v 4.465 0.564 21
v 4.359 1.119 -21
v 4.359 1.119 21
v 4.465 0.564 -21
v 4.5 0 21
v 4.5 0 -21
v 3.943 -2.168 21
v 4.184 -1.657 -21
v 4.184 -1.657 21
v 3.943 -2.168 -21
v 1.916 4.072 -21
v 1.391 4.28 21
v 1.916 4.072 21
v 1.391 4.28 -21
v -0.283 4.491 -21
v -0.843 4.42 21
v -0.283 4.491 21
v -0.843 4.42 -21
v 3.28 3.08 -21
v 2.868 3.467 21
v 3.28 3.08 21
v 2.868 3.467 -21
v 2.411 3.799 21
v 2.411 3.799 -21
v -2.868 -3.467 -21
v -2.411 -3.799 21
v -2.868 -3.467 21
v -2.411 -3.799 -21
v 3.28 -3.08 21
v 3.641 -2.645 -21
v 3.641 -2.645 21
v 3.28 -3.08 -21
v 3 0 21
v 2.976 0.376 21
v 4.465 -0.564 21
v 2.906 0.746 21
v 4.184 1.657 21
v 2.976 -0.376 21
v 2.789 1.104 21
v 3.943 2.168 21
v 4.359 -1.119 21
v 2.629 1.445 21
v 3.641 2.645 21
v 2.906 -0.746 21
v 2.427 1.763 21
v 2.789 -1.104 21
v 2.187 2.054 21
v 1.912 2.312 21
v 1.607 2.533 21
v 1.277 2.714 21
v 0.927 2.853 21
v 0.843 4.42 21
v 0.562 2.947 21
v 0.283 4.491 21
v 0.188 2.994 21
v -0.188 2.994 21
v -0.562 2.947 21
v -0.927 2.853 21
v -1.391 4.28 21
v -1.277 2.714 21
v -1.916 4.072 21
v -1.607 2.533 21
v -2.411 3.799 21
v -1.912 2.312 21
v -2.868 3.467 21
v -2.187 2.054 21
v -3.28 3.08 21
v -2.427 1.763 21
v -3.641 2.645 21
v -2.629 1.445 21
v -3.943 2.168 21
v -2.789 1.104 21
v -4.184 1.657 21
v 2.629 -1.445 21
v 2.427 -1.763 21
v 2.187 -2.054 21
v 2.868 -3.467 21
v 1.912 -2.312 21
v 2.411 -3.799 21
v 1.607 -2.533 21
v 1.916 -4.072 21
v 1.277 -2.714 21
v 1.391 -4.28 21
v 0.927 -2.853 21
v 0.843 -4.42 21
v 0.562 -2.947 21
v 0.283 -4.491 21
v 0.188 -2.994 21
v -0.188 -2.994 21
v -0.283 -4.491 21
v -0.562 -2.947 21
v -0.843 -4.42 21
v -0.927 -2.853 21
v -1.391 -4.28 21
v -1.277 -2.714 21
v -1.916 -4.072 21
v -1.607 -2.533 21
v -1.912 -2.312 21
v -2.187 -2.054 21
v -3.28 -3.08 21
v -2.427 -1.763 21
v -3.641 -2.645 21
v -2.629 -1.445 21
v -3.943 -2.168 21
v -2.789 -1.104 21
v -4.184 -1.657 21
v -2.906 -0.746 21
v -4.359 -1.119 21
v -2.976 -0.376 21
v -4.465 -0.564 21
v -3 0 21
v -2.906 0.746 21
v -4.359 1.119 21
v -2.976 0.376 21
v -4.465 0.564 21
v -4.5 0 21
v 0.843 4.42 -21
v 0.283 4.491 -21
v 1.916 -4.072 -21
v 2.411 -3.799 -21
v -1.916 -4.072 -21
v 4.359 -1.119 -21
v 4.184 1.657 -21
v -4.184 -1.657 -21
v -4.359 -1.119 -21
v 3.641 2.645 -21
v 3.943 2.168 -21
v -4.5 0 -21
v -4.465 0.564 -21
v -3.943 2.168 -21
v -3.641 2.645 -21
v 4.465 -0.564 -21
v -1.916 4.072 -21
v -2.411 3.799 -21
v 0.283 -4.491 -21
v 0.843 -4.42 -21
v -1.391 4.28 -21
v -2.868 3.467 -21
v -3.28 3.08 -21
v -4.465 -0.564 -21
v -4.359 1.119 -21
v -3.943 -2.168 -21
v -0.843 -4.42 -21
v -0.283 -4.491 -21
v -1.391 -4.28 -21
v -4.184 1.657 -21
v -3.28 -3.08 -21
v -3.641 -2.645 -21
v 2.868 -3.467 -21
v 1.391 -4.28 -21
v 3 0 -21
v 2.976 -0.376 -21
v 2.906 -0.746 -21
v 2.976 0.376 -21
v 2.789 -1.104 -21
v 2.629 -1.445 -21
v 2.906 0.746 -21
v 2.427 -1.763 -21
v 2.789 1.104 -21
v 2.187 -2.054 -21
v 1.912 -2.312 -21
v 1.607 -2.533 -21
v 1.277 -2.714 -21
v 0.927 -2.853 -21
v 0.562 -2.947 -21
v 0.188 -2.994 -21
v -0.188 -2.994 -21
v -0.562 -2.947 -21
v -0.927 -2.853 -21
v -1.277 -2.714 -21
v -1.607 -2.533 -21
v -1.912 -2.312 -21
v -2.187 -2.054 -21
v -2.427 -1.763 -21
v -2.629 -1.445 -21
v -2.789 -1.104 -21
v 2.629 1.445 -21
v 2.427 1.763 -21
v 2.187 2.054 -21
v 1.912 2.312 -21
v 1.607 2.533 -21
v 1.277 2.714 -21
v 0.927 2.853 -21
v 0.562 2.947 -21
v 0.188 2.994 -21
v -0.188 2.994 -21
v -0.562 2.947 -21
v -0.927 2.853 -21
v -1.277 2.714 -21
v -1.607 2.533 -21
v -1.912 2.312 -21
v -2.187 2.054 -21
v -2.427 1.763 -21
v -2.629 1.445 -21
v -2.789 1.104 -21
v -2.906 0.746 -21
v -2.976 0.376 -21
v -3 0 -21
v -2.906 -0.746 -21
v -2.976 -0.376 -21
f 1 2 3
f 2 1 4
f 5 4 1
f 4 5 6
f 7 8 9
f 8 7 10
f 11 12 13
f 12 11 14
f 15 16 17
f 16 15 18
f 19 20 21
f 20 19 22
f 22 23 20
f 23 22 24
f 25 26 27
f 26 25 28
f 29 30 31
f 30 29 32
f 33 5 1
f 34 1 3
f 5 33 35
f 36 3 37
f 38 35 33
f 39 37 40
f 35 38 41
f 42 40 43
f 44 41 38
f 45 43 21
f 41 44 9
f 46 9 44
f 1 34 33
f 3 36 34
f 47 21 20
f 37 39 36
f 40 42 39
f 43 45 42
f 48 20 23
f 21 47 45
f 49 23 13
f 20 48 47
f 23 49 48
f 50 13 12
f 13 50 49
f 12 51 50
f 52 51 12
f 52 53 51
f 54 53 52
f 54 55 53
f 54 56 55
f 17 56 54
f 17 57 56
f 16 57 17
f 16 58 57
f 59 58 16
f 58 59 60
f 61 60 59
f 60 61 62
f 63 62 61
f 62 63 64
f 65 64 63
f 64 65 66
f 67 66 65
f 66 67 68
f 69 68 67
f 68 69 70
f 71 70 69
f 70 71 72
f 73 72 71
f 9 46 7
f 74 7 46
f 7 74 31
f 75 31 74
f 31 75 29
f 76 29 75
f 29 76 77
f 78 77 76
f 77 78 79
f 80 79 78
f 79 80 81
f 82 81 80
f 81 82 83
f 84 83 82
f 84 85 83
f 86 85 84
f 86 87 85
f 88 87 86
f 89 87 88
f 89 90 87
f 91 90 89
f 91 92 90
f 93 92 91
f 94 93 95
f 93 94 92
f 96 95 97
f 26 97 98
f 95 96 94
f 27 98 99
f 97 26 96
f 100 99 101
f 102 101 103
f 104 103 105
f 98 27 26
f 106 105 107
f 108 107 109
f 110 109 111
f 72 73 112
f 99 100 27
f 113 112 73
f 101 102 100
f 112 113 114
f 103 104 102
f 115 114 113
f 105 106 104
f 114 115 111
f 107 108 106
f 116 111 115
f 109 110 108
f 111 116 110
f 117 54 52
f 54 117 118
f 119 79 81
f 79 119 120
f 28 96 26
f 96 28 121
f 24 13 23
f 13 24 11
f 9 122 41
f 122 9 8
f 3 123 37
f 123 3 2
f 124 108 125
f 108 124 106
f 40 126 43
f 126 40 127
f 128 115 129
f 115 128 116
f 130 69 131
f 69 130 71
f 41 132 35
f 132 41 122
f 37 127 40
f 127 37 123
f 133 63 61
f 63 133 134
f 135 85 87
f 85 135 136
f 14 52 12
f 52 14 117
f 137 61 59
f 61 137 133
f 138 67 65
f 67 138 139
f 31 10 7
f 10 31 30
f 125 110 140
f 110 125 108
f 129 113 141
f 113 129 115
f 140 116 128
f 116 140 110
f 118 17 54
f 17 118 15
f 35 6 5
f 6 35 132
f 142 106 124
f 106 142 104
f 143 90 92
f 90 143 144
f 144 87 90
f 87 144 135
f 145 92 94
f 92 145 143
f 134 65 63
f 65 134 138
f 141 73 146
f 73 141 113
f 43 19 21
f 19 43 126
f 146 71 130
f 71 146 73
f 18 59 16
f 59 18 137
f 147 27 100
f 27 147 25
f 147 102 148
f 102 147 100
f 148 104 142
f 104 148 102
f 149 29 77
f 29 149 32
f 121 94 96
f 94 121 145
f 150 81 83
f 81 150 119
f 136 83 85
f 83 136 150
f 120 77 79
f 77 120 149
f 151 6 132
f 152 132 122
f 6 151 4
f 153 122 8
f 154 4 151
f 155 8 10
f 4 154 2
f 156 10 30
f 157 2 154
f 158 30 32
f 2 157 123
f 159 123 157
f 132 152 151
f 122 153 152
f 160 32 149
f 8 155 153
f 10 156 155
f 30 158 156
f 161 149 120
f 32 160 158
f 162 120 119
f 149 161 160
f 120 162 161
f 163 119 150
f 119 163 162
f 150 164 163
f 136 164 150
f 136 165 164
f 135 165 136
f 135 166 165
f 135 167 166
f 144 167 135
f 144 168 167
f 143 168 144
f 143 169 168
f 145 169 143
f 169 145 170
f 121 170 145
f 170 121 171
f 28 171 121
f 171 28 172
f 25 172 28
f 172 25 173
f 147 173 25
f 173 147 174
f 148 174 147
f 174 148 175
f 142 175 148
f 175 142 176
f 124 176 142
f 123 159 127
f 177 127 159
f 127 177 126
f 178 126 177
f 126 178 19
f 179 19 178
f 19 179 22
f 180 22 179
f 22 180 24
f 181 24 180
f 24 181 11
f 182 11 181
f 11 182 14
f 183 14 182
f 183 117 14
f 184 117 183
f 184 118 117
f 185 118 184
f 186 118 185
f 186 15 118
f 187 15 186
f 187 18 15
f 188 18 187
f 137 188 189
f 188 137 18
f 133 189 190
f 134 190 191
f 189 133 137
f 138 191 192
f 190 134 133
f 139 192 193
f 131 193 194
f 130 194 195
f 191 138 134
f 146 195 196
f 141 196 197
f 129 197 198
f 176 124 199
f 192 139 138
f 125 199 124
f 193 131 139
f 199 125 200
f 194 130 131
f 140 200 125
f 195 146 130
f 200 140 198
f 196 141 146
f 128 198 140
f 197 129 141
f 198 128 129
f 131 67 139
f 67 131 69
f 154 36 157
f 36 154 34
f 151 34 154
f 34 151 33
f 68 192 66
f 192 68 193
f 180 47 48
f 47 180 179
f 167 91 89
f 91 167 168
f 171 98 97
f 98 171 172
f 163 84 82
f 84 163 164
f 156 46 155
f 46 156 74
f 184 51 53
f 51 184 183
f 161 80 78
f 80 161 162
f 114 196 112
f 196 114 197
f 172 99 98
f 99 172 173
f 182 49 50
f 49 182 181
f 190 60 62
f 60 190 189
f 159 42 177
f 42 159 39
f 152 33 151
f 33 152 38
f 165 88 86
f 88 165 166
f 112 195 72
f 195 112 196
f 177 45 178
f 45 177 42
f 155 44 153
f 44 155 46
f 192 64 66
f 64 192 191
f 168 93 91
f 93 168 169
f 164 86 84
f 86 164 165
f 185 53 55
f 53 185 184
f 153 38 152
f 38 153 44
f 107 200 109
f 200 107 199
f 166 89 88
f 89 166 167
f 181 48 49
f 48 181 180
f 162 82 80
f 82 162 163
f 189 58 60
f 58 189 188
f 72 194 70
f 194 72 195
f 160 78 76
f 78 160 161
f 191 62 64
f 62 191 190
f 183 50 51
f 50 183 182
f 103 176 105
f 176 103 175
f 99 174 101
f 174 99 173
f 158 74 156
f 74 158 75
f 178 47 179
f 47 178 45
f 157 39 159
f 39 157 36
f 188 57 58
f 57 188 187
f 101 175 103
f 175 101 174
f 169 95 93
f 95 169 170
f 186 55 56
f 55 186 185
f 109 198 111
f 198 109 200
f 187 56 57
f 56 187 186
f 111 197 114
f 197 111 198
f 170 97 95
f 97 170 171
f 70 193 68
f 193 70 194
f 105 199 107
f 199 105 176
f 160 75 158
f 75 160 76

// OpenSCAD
$fn = 50;


difference() {
	union() {
		translate(v = [0, 0, -21.0000000000]) {
			cylinder(h = 42, r = 4.5000000000);
		}
	}
	union() {
		translate(v = [0, 0, -100.0000000000]) {
			cylinder(h = 200, r = 3.0000000000);
		}
	}
}
